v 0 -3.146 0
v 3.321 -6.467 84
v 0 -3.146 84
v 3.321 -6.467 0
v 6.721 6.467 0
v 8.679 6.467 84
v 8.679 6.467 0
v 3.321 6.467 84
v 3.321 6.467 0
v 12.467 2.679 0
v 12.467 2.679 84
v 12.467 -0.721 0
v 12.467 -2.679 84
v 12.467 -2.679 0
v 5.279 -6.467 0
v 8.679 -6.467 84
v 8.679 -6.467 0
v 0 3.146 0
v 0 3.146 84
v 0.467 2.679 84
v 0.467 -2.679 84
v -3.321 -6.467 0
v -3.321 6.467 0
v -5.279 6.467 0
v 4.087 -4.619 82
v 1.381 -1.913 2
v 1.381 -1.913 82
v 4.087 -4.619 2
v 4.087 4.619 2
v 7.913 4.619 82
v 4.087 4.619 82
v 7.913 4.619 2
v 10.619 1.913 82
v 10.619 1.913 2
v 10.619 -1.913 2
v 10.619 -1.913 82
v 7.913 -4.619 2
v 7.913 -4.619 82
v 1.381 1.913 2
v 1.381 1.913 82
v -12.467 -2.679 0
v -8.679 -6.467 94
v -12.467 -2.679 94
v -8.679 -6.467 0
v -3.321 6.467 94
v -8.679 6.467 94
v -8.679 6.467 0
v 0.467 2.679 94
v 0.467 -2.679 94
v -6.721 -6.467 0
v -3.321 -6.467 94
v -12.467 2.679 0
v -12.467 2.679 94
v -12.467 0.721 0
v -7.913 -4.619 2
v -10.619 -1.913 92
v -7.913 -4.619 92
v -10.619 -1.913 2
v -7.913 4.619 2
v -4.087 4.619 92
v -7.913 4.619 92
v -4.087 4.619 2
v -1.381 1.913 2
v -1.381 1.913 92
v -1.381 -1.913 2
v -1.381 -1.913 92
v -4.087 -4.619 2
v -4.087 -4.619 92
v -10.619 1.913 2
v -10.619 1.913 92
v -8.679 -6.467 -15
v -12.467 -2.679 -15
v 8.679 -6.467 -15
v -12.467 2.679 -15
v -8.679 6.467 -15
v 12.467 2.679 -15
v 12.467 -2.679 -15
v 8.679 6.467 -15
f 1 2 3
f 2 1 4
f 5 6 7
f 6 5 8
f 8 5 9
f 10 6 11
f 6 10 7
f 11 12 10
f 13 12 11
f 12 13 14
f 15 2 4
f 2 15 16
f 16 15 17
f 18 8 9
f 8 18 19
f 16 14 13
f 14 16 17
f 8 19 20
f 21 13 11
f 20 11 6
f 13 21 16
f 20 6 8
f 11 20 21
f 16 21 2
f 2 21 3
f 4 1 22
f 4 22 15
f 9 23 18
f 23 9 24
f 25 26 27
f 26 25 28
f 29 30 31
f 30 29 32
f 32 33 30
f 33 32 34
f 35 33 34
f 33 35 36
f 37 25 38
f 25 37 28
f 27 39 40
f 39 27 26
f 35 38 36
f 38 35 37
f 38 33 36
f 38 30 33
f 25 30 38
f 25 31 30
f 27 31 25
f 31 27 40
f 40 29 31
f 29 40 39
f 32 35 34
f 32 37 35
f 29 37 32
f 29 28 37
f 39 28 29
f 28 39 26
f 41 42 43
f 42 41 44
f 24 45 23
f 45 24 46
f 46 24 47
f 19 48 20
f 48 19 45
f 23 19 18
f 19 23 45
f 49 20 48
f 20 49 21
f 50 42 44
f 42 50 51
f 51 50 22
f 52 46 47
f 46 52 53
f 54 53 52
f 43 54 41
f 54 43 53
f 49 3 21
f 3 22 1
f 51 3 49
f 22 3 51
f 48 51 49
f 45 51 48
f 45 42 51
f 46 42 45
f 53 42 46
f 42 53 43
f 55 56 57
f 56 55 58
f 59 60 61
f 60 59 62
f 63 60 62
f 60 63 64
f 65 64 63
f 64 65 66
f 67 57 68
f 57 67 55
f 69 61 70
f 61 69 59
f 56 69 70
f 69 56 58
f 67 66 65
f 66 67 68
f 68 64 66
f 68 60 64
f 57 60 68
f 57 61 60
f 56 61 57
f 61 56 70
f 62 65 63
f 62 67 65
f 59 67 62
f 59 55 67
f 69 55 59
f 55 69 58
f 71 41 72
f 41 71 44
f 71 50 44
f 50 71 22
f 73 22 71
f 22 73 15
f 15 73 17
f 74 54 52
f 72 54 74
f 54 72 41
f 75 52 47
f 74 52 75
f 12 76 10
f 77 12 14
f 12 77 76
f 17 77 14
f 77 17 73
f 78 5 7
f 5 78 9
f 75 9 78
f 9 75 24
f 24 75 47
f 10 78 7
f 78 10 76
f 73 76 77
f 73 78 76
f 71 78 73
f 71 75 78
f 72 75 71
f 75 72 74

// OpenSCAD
t_z = 14;
t_out_d = 16;
t_in_d = 10;

tune1 = 80;
tune2 = 90;

wall = 2;

tube_distance = wall+t_in_d;

module tube(tune = tune1) {
    rotate([0, 0, (360/8)/2]) difference() {
        translate([0,0,0]) cylinder(d=t_in_d+wall*2, h = tune+wall*2, $fn= 8);
        translate([0,0,wall]) cylinder(d=t_in_d, h = tune, $fn= 8);
    }
}


translate([tube_distance/2,0,0]) tube(tune1);
translate([-tube_distance/2,0,0]) tube(tune2);

//mouth piece
difference() {
hull() {
    translate([tube_distance/2,0,-15]) rotate([0, 0, (360/8)/2]) cylinder(d=t_in_d+wall*2, h = 15, $fn= 8);
    translate([-tube_distance/2,0,-15]) rotate([0, 0, (360/8)/2]) cylinder(d=t_in_d+wall*2, h = 15, $fn= 8);
}


}
